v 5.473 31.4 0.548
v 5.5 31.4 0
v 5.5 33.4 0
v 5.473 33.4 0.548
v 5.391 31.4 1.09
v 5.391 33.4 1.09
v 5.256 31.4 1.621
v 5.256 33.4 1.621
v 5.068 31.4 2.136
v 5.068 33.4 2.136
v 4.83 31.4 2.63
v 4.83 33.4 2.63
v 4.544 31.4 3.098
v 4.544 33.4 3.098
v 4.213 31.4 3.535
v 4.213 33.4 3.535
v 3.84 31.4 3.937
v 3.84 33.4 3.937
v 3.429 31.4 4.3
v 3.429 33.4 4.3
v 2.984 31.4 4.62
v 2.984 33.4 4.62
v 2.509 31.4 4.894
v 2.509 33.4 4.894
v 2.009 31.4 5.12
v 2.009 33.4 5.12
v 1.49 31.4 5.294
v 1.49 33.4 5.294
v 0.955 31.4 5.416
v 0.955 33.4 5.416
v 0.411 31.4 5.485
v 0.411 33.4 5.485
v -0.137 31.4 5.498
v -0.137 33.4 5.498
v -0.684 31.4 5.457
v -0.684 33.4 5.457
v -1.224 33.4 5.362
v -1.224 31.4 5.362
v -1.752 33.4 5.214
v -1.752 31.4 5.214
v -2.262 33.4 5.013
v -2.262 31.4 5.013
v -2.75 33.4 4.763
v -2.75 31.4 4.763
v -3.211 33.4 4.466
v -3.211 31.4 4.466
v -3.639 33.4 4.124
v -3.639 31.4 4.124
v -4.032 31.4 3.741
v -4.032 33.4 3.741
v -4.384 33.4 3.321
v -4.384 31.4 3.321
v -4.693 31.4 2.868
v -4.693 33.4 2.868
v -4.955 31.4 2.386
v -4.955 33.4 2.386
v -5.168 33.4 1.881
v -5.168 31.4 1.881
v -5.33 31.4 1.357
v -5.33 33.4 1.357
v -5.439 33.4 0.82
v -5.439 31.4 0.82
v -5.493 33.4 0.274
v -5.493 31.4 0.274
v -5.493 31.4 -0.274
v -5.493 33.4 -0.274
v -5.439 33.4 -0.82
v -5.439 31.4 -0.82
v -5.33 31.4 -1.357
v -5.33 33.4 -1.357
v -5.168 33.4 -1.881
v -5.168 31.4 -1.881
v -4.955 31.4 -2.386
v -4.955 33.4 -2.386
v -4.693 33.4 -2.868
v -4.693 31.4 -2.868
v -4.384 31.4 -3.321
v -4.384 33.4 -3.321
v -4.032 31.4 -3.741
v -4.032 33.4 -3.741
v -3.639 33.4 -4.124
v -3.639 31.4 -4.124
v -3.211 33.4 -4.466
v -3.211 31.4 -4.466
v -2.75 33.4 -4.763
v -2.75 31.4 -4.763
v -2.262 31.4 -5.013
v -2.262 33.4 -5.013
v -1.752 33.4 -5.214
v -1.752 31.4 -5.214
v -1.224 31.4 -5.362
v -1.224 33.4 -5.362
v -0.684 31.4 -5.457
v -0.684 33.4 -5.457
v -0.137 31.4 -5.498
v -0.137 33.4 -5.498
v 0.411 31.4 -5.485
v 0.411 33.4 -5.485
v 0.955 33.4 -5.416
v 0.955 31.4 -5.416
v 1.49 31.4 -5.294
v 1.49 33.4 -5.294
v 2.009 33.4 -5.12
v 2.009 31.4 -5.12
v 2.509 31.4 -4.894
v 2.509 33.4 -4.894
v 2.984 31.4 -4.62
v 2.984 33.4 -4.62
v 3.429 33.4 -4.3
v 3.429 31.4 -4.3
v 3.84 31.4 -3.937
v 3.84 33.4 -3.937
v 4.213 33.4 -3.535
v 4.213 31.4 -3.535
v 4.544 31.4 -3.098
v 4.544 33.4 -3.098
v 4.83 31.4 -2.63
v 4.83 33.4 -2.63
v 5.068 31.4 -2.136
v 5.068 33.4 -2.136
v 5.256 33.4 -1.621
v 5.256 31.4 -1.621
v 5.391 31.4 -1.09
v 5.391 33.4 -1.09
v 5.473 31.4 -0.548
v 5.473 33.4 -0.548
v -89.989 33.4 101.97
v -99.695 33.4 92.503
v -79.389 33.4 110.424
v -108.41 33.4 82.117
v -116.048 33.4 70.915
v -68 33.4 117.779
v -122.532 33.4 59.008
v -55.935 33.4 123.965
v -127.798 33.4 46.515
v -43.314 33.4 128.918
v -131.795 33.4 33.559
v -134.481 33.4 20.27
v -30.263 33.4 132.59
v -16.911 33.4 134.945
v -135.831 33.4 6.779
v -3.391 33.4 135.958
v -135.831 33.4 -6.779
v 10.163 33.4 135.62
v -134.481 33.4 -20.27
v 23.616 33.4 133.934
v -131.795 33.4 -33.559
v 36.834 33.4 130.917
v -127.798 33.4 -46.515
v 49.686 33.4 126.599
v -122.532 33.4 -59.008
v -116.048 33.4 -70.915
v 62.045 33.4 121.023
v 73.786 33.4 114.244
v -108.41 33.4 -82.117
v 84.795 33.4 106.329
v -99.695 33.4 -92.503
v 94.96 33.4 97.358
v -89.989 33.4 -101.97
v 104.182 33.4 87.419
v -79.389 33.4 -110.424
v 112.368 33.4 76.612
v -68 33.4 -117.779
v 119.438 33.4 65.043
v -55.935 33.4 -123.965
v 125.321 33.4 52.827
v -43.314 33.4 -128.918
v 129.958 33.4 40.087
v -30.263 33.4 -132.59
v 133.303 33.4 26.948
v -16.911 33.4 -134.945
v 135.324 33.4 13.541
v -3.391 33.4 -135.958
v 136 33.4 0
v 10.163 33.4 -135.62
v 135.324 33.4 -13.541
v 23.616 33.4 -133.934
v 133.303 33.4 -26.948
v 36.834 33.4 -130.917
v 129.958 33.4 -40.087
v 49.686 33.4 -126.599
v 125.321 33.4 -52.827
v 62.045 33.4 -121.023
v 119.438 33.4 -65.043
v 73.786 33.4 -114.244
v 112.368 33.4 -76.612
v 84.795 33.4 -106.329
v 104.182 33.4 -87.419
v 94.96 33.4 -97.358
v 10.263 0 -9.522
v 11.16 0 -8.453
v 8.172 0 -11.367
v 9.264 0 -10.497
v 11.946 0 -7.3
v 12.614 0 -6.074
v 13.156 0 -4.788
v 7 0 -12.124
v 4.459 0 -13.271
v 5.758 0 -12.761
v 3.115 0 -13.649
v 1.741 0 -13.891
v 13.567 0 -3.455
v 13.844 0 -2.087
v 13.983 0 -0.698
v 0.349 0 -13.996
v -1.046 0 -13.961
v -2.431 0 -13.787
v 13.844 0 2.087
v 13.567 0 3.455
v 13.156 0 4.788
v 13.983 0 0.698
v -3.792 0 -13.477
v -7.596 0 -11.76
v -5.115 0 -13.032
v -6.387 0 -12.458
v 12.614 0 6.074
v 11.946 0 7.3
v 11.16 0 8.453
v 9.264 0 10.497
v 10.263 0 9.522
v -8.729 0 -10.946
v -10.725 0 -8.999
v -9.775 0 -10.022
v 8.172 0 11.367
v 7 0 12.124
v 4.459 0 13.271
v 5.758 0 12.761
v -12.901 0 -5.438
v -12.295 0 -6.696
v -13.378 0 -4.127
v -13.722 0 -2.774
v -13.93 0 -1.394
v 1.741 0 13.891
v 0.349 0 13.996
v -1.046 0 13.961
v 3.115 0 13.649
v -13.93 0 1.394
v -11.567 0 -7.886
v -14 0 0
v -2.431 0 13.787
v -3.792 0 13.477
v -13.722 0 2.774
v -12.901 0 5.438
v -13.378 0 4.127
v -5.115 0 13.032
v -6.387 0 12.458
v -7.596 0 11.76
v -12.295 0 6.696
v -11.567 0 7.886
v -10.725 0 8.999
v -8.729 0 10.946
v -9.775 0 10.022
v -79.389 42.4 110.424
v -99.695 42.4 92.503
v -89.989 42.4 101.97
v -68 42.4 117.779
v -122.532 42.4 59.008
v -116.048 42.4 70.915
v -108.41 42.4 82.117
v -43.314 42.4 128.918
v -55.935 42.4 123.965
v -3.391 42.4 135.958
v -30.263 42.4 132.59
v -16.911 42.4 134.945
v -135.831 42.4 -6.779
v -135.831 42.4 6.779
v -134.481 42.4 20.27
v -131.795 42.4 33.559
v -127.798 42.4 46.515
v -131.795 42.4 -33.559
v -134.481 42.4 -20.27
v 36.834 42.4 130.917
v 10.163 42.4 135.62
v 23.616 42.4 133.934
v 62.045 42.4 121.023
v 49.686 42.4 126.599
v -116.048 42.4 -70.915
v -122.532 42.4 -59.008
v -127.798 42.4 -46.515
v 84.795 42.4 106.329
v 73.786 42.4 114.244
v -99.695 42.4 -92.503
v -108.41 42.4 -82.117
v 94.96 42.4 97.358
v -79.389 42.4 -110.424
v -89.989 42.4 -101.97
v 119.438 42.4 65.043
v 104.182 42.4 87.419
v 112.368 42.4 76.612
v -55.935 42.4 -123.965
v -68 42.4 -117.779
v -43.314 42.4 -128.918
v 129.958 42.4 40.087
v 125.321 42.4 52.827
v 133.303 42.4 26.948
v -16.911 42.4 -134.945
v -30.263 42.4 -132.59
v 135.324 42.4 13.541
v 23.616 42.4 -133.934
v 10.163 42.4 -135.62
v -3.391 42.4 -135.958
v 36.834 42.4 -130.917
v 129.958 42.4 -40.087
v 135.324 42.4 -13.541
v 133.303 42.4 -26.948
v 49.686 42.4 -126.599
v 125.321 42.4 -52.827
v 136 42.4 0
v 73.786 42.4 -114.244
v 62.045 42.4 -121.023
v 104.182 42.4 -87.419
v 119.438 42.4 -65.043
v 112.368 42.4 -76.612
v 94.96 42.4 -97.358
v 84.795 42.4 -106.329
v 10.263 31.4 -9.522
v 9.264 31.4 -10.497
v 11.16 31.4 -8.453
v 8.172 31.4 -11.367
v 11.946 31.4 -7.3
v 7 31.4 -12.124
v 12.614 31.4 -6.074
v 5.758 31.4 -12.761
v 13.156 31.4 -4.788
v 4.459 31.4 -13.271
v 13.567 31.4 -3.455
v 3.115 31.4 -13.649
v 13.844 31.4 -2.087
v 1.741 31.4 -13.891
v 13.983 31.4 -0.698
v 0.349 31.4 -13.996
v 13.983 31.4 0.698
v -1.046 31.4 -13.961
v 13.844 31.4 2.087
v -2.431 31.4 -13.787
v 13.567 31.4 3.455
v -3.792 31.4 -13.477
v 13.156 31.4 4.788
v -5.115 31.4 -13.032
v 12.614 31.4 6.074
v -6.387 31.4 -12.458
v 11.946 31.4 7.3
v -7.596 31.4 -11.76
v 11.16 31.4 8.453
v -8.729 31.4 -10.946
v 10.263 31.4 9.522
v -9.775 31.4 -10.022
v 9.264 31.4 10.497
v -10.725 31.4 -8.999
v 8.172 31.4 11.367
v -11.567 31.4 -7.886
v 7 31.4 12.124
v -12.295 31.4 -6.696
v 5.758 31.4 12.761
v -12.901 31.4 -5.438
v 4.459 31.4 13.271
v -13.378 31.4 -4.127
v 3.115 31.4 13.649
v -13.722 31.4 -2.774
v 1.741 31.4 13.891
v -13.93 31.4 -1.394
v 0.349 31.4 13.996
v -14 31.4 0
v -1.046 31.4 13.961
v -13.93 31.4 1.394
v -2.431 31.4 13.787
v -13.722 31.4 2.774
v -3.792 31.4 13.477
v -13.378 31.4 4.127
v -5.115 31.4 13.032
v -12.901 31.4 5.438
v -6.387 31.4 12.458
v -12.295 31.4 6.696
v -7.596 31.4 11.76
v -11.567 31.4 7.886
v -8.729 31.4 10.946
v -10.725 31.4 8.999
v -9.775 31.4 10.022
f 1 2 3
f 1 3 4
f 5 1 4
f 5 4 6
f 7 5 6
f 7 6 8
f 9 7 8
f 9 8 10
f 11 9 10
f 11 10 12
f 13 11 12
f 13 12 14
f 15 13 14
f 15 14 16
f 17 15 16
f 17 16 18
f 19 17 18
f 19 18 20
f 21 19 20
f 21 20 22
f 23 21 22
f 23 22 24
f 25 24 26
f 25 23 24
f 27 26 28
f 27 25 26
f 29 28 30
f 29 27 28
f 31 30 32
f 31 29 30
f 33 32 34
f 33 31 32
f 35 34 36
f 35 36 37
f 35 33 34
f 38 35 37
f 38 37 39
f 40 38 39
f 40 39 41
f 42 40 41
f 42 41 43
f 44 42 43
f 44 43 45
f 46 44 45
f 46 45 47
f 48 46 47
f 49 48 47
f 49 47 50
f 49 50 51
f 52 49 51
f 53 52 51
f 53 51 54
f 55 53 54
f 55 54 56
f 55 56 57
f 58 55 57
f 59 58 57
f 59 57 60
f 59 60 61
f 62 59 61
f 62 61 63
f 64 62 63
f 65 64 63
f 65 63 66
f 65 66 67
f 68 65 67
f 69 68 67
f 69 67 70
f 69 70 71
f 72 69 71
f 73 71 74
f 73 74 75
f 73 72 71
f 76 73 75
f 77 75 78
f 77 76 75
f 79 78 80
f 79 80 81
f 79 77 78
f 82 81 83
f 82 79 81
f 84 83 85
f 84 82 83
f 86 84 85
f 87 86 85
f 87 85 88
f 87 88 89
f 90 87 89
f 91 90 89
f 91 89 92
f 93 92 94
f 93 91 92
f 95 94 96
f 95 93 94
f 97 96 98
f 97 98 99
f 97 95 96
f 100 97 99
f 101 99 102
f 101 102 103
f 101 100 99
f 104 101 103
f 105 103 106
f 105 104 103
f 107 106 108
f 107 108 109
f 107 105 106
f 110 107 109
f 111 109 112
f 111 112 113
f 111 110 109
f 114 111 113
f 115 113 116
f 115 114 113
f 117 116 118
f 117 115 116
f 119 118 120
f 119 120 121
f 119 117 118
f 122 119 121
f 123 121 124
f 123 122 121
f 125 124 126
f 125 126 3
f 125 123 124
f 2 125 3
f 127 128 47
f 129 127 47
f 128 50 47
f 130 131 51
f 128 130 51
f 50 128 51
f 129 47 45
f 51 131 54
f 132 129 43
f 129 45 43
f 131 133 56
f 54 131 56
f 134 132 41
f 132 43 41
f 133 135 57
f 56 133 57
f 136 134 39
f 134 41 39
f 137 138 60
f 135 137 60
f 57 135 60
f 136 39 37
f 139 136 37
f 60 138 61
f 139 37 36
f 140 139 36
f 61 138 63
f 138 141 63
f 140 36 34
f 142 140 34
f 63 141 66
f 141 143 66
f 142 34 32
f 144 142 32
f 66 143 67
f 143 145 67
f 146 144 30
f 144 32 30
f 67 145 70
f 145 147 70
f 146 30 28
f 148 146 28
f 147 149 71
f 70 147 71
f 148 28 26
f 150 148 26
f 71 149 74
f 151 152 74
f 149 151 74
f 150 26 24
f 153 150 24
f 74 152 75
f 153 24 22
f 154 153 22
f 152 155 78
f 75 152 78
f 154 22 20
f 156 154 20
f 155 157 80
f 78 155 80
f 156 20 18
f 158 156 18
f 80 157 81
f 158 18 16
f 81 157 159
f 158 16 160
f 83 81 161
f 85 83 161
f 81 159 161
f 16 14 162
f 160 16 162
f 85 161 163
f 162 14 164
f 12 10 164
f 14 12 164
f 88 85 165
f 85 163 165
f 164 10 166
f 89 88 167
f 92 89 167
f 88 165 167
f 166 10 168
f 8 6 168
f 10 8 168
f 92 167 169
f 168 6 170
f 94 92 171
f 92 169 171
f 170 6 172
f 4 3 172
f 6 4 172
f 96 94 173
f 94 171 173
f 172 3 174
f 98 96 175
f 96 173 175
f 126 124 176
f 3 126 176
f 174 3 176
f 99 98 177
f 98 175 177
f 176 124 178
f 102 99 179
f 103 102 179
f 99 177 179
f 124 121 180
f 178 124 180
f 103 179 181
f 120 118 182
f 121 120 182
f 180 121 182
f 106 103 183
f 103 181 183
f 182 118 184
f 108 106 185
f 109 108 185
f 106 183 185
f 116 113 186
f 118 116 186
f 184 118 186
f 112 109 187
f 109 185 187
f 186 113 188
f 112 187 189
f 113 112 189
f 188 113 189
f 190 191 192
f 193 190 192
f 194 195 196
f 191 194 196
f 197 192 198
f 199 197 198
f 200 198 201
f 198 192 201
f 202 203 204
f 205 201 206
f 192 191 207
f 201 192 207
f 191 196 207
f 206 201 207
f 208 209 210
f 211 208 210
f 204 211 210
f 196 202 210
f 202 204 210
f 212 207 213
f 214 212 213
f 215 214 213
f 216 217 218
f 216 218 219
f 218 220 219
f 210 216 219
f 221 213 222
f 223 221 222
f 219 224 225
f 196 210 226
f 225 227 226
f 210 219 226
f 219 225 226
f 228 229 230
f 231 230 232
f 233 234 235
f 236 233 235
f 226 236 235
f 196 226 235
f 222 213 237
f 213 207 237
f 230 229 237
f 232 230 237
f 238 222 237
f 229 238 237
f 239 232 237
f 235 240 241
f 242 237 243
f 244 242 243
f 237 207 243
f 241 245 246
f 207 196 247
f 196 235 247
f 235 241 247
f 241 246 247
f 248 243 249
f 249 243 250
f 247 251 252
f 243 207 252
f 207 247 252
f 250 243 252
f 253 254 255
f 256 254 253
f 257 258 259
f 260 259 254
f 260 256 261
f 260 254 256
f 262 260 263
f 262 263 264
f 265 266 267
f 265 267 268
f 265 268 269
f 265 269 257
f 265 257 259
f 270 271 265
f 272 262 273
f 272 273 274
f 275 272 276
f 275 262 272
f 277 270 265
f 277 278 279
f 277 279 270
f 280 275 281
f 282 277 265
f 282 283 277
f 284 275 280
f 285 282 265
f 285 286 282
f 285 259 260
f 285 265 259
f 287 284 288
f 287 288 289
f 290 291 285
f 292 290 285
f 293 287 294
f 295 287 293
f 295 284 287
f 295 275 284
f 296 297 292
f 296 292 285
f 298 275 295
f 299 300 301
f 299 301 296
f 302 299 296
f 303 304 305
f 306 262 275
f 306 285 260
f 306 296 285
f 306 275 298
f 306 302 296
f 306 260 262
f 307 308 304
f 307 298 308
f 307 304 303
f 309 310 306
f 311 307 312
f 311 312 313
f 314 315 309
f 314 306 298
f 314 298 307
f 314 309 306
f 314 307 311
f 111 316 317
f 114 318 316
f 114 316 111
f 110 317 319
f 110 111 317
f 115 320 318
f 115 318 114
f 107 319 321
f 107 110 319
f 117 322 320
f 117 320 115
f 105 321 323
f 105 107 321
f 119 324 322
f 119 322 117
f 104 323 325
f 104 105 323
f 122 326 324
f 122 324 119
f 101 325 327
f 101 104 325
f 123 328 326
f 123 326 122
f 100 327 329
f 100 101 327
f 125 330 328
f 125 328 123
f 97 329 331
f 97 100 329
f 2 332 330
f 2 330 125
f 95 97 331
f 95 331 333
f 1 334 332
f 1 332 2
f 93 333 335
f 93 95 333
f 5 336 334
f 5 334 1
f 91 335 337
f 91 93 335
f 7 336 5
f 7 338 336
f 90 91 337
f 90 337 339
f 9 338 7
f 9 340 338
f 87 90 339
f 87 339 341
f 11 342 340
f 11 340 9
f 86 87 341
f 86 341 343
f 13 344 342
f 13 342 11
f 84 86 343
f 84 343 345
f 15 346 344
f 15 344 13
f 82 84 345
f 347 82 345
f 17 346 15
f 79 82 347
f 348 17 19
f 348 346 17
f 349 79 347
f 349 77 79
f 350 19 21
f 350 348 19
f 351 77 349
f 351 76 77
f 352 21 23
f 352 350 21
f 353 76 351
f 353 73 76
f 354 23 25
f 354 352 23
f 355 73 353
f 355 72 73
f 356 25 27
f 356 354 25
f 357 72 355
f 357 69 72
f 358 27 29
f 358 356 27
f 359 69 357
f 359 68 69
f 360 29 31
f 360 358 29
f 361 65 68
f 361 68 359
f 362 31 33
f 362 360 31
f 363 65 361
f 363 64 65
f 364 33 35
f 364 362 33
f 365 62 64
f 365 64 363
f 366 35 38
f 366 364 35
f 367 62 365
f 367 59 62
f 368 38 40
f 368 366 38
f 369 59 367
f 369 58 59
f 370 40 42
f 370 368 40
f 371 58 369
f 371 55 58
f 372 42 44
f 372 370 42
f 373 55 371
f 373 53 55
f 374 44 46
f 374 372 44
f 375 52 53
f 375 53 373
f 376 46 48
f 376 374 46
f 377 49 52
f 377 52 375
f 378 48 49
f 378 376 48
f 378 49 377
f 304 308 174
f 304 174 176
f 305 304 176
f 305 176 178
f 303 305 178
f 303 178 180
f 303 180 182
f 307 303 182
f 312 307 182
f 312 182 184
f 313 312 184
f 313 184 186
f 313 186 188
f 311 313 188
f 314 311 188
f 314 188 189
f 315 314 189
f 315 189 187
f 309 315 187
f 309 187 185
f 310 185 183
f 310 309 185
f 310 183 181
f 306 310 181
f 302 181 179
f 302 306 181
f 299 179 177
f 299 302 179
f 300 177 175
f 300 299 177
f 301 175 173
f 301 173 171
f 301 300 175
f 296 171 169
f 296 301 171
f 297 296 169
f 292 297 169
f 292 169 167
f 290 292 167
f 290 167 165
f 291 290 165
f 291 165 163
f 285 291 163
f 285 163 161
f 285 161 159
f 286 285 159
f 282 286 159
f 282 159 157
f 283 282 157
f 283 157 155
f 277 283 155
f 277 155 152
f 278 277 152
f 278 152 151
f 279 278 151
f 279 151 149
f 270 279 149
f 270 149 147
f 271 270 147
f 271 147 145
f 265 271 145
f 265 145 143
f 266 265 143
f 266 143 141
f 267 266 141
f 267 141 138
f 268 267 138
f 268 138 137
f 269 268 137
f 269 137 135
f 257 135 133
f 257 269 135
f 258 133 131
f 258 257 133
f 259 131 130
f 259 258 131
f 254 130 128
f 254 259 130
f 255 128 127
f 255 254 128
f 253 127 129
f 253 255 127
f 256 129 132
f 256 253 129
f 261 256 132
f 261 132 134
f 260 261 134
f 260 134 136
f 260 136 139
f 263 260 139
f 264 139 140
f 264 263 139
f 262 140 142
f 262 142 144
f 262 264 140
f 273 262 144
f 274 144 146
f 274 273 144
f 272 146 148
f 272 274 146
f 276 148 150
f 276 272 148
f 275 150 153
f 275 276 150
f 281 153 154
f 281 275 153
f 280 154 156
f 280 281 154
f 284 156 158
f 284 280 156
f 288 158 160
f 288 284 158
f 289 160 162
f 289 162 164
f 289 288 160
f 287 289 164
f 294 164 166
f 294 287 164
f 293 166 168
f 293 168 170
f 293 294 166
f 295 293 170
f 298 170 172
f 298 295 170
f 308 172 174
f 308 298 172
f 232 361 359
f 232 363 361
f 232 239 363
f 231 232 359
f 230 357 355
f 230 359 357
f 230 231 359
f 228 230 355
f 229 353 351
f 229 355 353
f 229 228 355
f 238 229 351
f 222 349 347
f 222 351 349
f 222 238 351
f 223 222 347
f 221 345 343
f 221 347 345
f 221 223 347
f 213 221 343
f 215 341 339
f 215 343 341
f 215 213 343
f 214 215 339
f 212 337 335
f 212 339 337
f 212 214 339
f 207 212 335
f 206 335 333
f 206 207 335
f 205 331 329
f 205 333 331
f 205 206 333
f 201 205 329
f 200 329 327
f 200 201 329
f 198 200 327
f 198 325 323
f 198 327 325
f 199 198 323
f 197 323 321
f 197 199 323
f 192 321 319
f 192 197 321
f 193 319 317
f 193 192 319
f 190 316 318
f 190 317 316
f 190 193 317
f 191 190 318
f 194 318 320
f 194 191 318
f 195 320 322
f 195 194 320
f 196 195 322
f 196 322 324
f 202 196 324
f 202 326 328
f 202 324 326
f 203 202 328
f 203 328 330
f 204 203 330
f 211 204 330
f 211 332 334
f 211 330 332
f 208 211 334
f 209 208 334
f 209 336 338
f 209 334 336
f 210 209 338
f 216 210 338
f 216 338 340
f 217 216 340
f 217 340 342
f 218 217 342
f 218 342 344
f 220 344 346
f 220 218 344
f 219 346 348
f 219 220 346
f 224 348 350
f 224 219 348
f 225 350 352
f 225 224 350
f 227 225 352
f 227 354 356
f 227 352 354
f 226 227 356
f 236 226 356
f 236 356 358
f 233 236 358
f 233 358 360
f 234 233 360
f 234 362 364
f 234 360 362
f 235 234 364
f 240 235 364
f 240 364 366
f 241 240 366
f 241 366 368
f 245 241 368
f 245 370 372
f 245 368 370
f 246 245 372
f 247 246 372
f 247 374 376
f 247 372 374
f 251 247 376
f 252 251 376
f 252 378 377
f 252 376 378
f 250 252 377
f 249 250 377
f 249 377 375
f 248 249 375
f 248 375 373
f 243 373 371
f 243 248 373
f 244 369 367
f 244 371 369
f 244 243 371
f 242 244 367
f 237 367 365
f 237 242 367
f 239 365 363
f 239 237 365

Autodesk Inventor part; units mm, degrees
ref_plane "YZ Plane" through (0, 0, 0) normal (1, 0, 0) x (0, 1, 0)
ref_plane "XZ Plane" through (0, 0, 0) normal (0, 1, 0) x (-1, 0, 0)
ref_plane "XY Plane" through (0, 0, 0) normal (0, 0, 1) x (1, 0, 0)
sketch "Sketch1" plane through (0, 0, 0) normal (0, 1, 0) x (-1, 0, 0)
  circle A0 centre (0, 0) radius 14
  dimension "d0" = 28
extrude "Extrusion1" add sketch "Sketch1" along normal blind 31.4
sketch "Sketch2" plane through (0, 31.4, 0) normal (0, 1, 0) x (1, 0, 0)
  circle A0 centre (0, 0) radius 5.5
  dimension "d3" = 11
extrude "Extrusion2" add sketch "Sketch2" along normal blind 11
sketch "Sketch3" plane through (0, 42.4, 0) normal (0, 1, 0) x (1, 0, 0)
  circle A0 centre (0, 0) radius 14 projected
  circle A1 centre (0, 0) radius 136
  dimension "d6" = 272
extrude "Extrusion3" add sketch "Sketch3" against normal blind 9 contours A0 | A1
properties part number "motor_with_prop"
